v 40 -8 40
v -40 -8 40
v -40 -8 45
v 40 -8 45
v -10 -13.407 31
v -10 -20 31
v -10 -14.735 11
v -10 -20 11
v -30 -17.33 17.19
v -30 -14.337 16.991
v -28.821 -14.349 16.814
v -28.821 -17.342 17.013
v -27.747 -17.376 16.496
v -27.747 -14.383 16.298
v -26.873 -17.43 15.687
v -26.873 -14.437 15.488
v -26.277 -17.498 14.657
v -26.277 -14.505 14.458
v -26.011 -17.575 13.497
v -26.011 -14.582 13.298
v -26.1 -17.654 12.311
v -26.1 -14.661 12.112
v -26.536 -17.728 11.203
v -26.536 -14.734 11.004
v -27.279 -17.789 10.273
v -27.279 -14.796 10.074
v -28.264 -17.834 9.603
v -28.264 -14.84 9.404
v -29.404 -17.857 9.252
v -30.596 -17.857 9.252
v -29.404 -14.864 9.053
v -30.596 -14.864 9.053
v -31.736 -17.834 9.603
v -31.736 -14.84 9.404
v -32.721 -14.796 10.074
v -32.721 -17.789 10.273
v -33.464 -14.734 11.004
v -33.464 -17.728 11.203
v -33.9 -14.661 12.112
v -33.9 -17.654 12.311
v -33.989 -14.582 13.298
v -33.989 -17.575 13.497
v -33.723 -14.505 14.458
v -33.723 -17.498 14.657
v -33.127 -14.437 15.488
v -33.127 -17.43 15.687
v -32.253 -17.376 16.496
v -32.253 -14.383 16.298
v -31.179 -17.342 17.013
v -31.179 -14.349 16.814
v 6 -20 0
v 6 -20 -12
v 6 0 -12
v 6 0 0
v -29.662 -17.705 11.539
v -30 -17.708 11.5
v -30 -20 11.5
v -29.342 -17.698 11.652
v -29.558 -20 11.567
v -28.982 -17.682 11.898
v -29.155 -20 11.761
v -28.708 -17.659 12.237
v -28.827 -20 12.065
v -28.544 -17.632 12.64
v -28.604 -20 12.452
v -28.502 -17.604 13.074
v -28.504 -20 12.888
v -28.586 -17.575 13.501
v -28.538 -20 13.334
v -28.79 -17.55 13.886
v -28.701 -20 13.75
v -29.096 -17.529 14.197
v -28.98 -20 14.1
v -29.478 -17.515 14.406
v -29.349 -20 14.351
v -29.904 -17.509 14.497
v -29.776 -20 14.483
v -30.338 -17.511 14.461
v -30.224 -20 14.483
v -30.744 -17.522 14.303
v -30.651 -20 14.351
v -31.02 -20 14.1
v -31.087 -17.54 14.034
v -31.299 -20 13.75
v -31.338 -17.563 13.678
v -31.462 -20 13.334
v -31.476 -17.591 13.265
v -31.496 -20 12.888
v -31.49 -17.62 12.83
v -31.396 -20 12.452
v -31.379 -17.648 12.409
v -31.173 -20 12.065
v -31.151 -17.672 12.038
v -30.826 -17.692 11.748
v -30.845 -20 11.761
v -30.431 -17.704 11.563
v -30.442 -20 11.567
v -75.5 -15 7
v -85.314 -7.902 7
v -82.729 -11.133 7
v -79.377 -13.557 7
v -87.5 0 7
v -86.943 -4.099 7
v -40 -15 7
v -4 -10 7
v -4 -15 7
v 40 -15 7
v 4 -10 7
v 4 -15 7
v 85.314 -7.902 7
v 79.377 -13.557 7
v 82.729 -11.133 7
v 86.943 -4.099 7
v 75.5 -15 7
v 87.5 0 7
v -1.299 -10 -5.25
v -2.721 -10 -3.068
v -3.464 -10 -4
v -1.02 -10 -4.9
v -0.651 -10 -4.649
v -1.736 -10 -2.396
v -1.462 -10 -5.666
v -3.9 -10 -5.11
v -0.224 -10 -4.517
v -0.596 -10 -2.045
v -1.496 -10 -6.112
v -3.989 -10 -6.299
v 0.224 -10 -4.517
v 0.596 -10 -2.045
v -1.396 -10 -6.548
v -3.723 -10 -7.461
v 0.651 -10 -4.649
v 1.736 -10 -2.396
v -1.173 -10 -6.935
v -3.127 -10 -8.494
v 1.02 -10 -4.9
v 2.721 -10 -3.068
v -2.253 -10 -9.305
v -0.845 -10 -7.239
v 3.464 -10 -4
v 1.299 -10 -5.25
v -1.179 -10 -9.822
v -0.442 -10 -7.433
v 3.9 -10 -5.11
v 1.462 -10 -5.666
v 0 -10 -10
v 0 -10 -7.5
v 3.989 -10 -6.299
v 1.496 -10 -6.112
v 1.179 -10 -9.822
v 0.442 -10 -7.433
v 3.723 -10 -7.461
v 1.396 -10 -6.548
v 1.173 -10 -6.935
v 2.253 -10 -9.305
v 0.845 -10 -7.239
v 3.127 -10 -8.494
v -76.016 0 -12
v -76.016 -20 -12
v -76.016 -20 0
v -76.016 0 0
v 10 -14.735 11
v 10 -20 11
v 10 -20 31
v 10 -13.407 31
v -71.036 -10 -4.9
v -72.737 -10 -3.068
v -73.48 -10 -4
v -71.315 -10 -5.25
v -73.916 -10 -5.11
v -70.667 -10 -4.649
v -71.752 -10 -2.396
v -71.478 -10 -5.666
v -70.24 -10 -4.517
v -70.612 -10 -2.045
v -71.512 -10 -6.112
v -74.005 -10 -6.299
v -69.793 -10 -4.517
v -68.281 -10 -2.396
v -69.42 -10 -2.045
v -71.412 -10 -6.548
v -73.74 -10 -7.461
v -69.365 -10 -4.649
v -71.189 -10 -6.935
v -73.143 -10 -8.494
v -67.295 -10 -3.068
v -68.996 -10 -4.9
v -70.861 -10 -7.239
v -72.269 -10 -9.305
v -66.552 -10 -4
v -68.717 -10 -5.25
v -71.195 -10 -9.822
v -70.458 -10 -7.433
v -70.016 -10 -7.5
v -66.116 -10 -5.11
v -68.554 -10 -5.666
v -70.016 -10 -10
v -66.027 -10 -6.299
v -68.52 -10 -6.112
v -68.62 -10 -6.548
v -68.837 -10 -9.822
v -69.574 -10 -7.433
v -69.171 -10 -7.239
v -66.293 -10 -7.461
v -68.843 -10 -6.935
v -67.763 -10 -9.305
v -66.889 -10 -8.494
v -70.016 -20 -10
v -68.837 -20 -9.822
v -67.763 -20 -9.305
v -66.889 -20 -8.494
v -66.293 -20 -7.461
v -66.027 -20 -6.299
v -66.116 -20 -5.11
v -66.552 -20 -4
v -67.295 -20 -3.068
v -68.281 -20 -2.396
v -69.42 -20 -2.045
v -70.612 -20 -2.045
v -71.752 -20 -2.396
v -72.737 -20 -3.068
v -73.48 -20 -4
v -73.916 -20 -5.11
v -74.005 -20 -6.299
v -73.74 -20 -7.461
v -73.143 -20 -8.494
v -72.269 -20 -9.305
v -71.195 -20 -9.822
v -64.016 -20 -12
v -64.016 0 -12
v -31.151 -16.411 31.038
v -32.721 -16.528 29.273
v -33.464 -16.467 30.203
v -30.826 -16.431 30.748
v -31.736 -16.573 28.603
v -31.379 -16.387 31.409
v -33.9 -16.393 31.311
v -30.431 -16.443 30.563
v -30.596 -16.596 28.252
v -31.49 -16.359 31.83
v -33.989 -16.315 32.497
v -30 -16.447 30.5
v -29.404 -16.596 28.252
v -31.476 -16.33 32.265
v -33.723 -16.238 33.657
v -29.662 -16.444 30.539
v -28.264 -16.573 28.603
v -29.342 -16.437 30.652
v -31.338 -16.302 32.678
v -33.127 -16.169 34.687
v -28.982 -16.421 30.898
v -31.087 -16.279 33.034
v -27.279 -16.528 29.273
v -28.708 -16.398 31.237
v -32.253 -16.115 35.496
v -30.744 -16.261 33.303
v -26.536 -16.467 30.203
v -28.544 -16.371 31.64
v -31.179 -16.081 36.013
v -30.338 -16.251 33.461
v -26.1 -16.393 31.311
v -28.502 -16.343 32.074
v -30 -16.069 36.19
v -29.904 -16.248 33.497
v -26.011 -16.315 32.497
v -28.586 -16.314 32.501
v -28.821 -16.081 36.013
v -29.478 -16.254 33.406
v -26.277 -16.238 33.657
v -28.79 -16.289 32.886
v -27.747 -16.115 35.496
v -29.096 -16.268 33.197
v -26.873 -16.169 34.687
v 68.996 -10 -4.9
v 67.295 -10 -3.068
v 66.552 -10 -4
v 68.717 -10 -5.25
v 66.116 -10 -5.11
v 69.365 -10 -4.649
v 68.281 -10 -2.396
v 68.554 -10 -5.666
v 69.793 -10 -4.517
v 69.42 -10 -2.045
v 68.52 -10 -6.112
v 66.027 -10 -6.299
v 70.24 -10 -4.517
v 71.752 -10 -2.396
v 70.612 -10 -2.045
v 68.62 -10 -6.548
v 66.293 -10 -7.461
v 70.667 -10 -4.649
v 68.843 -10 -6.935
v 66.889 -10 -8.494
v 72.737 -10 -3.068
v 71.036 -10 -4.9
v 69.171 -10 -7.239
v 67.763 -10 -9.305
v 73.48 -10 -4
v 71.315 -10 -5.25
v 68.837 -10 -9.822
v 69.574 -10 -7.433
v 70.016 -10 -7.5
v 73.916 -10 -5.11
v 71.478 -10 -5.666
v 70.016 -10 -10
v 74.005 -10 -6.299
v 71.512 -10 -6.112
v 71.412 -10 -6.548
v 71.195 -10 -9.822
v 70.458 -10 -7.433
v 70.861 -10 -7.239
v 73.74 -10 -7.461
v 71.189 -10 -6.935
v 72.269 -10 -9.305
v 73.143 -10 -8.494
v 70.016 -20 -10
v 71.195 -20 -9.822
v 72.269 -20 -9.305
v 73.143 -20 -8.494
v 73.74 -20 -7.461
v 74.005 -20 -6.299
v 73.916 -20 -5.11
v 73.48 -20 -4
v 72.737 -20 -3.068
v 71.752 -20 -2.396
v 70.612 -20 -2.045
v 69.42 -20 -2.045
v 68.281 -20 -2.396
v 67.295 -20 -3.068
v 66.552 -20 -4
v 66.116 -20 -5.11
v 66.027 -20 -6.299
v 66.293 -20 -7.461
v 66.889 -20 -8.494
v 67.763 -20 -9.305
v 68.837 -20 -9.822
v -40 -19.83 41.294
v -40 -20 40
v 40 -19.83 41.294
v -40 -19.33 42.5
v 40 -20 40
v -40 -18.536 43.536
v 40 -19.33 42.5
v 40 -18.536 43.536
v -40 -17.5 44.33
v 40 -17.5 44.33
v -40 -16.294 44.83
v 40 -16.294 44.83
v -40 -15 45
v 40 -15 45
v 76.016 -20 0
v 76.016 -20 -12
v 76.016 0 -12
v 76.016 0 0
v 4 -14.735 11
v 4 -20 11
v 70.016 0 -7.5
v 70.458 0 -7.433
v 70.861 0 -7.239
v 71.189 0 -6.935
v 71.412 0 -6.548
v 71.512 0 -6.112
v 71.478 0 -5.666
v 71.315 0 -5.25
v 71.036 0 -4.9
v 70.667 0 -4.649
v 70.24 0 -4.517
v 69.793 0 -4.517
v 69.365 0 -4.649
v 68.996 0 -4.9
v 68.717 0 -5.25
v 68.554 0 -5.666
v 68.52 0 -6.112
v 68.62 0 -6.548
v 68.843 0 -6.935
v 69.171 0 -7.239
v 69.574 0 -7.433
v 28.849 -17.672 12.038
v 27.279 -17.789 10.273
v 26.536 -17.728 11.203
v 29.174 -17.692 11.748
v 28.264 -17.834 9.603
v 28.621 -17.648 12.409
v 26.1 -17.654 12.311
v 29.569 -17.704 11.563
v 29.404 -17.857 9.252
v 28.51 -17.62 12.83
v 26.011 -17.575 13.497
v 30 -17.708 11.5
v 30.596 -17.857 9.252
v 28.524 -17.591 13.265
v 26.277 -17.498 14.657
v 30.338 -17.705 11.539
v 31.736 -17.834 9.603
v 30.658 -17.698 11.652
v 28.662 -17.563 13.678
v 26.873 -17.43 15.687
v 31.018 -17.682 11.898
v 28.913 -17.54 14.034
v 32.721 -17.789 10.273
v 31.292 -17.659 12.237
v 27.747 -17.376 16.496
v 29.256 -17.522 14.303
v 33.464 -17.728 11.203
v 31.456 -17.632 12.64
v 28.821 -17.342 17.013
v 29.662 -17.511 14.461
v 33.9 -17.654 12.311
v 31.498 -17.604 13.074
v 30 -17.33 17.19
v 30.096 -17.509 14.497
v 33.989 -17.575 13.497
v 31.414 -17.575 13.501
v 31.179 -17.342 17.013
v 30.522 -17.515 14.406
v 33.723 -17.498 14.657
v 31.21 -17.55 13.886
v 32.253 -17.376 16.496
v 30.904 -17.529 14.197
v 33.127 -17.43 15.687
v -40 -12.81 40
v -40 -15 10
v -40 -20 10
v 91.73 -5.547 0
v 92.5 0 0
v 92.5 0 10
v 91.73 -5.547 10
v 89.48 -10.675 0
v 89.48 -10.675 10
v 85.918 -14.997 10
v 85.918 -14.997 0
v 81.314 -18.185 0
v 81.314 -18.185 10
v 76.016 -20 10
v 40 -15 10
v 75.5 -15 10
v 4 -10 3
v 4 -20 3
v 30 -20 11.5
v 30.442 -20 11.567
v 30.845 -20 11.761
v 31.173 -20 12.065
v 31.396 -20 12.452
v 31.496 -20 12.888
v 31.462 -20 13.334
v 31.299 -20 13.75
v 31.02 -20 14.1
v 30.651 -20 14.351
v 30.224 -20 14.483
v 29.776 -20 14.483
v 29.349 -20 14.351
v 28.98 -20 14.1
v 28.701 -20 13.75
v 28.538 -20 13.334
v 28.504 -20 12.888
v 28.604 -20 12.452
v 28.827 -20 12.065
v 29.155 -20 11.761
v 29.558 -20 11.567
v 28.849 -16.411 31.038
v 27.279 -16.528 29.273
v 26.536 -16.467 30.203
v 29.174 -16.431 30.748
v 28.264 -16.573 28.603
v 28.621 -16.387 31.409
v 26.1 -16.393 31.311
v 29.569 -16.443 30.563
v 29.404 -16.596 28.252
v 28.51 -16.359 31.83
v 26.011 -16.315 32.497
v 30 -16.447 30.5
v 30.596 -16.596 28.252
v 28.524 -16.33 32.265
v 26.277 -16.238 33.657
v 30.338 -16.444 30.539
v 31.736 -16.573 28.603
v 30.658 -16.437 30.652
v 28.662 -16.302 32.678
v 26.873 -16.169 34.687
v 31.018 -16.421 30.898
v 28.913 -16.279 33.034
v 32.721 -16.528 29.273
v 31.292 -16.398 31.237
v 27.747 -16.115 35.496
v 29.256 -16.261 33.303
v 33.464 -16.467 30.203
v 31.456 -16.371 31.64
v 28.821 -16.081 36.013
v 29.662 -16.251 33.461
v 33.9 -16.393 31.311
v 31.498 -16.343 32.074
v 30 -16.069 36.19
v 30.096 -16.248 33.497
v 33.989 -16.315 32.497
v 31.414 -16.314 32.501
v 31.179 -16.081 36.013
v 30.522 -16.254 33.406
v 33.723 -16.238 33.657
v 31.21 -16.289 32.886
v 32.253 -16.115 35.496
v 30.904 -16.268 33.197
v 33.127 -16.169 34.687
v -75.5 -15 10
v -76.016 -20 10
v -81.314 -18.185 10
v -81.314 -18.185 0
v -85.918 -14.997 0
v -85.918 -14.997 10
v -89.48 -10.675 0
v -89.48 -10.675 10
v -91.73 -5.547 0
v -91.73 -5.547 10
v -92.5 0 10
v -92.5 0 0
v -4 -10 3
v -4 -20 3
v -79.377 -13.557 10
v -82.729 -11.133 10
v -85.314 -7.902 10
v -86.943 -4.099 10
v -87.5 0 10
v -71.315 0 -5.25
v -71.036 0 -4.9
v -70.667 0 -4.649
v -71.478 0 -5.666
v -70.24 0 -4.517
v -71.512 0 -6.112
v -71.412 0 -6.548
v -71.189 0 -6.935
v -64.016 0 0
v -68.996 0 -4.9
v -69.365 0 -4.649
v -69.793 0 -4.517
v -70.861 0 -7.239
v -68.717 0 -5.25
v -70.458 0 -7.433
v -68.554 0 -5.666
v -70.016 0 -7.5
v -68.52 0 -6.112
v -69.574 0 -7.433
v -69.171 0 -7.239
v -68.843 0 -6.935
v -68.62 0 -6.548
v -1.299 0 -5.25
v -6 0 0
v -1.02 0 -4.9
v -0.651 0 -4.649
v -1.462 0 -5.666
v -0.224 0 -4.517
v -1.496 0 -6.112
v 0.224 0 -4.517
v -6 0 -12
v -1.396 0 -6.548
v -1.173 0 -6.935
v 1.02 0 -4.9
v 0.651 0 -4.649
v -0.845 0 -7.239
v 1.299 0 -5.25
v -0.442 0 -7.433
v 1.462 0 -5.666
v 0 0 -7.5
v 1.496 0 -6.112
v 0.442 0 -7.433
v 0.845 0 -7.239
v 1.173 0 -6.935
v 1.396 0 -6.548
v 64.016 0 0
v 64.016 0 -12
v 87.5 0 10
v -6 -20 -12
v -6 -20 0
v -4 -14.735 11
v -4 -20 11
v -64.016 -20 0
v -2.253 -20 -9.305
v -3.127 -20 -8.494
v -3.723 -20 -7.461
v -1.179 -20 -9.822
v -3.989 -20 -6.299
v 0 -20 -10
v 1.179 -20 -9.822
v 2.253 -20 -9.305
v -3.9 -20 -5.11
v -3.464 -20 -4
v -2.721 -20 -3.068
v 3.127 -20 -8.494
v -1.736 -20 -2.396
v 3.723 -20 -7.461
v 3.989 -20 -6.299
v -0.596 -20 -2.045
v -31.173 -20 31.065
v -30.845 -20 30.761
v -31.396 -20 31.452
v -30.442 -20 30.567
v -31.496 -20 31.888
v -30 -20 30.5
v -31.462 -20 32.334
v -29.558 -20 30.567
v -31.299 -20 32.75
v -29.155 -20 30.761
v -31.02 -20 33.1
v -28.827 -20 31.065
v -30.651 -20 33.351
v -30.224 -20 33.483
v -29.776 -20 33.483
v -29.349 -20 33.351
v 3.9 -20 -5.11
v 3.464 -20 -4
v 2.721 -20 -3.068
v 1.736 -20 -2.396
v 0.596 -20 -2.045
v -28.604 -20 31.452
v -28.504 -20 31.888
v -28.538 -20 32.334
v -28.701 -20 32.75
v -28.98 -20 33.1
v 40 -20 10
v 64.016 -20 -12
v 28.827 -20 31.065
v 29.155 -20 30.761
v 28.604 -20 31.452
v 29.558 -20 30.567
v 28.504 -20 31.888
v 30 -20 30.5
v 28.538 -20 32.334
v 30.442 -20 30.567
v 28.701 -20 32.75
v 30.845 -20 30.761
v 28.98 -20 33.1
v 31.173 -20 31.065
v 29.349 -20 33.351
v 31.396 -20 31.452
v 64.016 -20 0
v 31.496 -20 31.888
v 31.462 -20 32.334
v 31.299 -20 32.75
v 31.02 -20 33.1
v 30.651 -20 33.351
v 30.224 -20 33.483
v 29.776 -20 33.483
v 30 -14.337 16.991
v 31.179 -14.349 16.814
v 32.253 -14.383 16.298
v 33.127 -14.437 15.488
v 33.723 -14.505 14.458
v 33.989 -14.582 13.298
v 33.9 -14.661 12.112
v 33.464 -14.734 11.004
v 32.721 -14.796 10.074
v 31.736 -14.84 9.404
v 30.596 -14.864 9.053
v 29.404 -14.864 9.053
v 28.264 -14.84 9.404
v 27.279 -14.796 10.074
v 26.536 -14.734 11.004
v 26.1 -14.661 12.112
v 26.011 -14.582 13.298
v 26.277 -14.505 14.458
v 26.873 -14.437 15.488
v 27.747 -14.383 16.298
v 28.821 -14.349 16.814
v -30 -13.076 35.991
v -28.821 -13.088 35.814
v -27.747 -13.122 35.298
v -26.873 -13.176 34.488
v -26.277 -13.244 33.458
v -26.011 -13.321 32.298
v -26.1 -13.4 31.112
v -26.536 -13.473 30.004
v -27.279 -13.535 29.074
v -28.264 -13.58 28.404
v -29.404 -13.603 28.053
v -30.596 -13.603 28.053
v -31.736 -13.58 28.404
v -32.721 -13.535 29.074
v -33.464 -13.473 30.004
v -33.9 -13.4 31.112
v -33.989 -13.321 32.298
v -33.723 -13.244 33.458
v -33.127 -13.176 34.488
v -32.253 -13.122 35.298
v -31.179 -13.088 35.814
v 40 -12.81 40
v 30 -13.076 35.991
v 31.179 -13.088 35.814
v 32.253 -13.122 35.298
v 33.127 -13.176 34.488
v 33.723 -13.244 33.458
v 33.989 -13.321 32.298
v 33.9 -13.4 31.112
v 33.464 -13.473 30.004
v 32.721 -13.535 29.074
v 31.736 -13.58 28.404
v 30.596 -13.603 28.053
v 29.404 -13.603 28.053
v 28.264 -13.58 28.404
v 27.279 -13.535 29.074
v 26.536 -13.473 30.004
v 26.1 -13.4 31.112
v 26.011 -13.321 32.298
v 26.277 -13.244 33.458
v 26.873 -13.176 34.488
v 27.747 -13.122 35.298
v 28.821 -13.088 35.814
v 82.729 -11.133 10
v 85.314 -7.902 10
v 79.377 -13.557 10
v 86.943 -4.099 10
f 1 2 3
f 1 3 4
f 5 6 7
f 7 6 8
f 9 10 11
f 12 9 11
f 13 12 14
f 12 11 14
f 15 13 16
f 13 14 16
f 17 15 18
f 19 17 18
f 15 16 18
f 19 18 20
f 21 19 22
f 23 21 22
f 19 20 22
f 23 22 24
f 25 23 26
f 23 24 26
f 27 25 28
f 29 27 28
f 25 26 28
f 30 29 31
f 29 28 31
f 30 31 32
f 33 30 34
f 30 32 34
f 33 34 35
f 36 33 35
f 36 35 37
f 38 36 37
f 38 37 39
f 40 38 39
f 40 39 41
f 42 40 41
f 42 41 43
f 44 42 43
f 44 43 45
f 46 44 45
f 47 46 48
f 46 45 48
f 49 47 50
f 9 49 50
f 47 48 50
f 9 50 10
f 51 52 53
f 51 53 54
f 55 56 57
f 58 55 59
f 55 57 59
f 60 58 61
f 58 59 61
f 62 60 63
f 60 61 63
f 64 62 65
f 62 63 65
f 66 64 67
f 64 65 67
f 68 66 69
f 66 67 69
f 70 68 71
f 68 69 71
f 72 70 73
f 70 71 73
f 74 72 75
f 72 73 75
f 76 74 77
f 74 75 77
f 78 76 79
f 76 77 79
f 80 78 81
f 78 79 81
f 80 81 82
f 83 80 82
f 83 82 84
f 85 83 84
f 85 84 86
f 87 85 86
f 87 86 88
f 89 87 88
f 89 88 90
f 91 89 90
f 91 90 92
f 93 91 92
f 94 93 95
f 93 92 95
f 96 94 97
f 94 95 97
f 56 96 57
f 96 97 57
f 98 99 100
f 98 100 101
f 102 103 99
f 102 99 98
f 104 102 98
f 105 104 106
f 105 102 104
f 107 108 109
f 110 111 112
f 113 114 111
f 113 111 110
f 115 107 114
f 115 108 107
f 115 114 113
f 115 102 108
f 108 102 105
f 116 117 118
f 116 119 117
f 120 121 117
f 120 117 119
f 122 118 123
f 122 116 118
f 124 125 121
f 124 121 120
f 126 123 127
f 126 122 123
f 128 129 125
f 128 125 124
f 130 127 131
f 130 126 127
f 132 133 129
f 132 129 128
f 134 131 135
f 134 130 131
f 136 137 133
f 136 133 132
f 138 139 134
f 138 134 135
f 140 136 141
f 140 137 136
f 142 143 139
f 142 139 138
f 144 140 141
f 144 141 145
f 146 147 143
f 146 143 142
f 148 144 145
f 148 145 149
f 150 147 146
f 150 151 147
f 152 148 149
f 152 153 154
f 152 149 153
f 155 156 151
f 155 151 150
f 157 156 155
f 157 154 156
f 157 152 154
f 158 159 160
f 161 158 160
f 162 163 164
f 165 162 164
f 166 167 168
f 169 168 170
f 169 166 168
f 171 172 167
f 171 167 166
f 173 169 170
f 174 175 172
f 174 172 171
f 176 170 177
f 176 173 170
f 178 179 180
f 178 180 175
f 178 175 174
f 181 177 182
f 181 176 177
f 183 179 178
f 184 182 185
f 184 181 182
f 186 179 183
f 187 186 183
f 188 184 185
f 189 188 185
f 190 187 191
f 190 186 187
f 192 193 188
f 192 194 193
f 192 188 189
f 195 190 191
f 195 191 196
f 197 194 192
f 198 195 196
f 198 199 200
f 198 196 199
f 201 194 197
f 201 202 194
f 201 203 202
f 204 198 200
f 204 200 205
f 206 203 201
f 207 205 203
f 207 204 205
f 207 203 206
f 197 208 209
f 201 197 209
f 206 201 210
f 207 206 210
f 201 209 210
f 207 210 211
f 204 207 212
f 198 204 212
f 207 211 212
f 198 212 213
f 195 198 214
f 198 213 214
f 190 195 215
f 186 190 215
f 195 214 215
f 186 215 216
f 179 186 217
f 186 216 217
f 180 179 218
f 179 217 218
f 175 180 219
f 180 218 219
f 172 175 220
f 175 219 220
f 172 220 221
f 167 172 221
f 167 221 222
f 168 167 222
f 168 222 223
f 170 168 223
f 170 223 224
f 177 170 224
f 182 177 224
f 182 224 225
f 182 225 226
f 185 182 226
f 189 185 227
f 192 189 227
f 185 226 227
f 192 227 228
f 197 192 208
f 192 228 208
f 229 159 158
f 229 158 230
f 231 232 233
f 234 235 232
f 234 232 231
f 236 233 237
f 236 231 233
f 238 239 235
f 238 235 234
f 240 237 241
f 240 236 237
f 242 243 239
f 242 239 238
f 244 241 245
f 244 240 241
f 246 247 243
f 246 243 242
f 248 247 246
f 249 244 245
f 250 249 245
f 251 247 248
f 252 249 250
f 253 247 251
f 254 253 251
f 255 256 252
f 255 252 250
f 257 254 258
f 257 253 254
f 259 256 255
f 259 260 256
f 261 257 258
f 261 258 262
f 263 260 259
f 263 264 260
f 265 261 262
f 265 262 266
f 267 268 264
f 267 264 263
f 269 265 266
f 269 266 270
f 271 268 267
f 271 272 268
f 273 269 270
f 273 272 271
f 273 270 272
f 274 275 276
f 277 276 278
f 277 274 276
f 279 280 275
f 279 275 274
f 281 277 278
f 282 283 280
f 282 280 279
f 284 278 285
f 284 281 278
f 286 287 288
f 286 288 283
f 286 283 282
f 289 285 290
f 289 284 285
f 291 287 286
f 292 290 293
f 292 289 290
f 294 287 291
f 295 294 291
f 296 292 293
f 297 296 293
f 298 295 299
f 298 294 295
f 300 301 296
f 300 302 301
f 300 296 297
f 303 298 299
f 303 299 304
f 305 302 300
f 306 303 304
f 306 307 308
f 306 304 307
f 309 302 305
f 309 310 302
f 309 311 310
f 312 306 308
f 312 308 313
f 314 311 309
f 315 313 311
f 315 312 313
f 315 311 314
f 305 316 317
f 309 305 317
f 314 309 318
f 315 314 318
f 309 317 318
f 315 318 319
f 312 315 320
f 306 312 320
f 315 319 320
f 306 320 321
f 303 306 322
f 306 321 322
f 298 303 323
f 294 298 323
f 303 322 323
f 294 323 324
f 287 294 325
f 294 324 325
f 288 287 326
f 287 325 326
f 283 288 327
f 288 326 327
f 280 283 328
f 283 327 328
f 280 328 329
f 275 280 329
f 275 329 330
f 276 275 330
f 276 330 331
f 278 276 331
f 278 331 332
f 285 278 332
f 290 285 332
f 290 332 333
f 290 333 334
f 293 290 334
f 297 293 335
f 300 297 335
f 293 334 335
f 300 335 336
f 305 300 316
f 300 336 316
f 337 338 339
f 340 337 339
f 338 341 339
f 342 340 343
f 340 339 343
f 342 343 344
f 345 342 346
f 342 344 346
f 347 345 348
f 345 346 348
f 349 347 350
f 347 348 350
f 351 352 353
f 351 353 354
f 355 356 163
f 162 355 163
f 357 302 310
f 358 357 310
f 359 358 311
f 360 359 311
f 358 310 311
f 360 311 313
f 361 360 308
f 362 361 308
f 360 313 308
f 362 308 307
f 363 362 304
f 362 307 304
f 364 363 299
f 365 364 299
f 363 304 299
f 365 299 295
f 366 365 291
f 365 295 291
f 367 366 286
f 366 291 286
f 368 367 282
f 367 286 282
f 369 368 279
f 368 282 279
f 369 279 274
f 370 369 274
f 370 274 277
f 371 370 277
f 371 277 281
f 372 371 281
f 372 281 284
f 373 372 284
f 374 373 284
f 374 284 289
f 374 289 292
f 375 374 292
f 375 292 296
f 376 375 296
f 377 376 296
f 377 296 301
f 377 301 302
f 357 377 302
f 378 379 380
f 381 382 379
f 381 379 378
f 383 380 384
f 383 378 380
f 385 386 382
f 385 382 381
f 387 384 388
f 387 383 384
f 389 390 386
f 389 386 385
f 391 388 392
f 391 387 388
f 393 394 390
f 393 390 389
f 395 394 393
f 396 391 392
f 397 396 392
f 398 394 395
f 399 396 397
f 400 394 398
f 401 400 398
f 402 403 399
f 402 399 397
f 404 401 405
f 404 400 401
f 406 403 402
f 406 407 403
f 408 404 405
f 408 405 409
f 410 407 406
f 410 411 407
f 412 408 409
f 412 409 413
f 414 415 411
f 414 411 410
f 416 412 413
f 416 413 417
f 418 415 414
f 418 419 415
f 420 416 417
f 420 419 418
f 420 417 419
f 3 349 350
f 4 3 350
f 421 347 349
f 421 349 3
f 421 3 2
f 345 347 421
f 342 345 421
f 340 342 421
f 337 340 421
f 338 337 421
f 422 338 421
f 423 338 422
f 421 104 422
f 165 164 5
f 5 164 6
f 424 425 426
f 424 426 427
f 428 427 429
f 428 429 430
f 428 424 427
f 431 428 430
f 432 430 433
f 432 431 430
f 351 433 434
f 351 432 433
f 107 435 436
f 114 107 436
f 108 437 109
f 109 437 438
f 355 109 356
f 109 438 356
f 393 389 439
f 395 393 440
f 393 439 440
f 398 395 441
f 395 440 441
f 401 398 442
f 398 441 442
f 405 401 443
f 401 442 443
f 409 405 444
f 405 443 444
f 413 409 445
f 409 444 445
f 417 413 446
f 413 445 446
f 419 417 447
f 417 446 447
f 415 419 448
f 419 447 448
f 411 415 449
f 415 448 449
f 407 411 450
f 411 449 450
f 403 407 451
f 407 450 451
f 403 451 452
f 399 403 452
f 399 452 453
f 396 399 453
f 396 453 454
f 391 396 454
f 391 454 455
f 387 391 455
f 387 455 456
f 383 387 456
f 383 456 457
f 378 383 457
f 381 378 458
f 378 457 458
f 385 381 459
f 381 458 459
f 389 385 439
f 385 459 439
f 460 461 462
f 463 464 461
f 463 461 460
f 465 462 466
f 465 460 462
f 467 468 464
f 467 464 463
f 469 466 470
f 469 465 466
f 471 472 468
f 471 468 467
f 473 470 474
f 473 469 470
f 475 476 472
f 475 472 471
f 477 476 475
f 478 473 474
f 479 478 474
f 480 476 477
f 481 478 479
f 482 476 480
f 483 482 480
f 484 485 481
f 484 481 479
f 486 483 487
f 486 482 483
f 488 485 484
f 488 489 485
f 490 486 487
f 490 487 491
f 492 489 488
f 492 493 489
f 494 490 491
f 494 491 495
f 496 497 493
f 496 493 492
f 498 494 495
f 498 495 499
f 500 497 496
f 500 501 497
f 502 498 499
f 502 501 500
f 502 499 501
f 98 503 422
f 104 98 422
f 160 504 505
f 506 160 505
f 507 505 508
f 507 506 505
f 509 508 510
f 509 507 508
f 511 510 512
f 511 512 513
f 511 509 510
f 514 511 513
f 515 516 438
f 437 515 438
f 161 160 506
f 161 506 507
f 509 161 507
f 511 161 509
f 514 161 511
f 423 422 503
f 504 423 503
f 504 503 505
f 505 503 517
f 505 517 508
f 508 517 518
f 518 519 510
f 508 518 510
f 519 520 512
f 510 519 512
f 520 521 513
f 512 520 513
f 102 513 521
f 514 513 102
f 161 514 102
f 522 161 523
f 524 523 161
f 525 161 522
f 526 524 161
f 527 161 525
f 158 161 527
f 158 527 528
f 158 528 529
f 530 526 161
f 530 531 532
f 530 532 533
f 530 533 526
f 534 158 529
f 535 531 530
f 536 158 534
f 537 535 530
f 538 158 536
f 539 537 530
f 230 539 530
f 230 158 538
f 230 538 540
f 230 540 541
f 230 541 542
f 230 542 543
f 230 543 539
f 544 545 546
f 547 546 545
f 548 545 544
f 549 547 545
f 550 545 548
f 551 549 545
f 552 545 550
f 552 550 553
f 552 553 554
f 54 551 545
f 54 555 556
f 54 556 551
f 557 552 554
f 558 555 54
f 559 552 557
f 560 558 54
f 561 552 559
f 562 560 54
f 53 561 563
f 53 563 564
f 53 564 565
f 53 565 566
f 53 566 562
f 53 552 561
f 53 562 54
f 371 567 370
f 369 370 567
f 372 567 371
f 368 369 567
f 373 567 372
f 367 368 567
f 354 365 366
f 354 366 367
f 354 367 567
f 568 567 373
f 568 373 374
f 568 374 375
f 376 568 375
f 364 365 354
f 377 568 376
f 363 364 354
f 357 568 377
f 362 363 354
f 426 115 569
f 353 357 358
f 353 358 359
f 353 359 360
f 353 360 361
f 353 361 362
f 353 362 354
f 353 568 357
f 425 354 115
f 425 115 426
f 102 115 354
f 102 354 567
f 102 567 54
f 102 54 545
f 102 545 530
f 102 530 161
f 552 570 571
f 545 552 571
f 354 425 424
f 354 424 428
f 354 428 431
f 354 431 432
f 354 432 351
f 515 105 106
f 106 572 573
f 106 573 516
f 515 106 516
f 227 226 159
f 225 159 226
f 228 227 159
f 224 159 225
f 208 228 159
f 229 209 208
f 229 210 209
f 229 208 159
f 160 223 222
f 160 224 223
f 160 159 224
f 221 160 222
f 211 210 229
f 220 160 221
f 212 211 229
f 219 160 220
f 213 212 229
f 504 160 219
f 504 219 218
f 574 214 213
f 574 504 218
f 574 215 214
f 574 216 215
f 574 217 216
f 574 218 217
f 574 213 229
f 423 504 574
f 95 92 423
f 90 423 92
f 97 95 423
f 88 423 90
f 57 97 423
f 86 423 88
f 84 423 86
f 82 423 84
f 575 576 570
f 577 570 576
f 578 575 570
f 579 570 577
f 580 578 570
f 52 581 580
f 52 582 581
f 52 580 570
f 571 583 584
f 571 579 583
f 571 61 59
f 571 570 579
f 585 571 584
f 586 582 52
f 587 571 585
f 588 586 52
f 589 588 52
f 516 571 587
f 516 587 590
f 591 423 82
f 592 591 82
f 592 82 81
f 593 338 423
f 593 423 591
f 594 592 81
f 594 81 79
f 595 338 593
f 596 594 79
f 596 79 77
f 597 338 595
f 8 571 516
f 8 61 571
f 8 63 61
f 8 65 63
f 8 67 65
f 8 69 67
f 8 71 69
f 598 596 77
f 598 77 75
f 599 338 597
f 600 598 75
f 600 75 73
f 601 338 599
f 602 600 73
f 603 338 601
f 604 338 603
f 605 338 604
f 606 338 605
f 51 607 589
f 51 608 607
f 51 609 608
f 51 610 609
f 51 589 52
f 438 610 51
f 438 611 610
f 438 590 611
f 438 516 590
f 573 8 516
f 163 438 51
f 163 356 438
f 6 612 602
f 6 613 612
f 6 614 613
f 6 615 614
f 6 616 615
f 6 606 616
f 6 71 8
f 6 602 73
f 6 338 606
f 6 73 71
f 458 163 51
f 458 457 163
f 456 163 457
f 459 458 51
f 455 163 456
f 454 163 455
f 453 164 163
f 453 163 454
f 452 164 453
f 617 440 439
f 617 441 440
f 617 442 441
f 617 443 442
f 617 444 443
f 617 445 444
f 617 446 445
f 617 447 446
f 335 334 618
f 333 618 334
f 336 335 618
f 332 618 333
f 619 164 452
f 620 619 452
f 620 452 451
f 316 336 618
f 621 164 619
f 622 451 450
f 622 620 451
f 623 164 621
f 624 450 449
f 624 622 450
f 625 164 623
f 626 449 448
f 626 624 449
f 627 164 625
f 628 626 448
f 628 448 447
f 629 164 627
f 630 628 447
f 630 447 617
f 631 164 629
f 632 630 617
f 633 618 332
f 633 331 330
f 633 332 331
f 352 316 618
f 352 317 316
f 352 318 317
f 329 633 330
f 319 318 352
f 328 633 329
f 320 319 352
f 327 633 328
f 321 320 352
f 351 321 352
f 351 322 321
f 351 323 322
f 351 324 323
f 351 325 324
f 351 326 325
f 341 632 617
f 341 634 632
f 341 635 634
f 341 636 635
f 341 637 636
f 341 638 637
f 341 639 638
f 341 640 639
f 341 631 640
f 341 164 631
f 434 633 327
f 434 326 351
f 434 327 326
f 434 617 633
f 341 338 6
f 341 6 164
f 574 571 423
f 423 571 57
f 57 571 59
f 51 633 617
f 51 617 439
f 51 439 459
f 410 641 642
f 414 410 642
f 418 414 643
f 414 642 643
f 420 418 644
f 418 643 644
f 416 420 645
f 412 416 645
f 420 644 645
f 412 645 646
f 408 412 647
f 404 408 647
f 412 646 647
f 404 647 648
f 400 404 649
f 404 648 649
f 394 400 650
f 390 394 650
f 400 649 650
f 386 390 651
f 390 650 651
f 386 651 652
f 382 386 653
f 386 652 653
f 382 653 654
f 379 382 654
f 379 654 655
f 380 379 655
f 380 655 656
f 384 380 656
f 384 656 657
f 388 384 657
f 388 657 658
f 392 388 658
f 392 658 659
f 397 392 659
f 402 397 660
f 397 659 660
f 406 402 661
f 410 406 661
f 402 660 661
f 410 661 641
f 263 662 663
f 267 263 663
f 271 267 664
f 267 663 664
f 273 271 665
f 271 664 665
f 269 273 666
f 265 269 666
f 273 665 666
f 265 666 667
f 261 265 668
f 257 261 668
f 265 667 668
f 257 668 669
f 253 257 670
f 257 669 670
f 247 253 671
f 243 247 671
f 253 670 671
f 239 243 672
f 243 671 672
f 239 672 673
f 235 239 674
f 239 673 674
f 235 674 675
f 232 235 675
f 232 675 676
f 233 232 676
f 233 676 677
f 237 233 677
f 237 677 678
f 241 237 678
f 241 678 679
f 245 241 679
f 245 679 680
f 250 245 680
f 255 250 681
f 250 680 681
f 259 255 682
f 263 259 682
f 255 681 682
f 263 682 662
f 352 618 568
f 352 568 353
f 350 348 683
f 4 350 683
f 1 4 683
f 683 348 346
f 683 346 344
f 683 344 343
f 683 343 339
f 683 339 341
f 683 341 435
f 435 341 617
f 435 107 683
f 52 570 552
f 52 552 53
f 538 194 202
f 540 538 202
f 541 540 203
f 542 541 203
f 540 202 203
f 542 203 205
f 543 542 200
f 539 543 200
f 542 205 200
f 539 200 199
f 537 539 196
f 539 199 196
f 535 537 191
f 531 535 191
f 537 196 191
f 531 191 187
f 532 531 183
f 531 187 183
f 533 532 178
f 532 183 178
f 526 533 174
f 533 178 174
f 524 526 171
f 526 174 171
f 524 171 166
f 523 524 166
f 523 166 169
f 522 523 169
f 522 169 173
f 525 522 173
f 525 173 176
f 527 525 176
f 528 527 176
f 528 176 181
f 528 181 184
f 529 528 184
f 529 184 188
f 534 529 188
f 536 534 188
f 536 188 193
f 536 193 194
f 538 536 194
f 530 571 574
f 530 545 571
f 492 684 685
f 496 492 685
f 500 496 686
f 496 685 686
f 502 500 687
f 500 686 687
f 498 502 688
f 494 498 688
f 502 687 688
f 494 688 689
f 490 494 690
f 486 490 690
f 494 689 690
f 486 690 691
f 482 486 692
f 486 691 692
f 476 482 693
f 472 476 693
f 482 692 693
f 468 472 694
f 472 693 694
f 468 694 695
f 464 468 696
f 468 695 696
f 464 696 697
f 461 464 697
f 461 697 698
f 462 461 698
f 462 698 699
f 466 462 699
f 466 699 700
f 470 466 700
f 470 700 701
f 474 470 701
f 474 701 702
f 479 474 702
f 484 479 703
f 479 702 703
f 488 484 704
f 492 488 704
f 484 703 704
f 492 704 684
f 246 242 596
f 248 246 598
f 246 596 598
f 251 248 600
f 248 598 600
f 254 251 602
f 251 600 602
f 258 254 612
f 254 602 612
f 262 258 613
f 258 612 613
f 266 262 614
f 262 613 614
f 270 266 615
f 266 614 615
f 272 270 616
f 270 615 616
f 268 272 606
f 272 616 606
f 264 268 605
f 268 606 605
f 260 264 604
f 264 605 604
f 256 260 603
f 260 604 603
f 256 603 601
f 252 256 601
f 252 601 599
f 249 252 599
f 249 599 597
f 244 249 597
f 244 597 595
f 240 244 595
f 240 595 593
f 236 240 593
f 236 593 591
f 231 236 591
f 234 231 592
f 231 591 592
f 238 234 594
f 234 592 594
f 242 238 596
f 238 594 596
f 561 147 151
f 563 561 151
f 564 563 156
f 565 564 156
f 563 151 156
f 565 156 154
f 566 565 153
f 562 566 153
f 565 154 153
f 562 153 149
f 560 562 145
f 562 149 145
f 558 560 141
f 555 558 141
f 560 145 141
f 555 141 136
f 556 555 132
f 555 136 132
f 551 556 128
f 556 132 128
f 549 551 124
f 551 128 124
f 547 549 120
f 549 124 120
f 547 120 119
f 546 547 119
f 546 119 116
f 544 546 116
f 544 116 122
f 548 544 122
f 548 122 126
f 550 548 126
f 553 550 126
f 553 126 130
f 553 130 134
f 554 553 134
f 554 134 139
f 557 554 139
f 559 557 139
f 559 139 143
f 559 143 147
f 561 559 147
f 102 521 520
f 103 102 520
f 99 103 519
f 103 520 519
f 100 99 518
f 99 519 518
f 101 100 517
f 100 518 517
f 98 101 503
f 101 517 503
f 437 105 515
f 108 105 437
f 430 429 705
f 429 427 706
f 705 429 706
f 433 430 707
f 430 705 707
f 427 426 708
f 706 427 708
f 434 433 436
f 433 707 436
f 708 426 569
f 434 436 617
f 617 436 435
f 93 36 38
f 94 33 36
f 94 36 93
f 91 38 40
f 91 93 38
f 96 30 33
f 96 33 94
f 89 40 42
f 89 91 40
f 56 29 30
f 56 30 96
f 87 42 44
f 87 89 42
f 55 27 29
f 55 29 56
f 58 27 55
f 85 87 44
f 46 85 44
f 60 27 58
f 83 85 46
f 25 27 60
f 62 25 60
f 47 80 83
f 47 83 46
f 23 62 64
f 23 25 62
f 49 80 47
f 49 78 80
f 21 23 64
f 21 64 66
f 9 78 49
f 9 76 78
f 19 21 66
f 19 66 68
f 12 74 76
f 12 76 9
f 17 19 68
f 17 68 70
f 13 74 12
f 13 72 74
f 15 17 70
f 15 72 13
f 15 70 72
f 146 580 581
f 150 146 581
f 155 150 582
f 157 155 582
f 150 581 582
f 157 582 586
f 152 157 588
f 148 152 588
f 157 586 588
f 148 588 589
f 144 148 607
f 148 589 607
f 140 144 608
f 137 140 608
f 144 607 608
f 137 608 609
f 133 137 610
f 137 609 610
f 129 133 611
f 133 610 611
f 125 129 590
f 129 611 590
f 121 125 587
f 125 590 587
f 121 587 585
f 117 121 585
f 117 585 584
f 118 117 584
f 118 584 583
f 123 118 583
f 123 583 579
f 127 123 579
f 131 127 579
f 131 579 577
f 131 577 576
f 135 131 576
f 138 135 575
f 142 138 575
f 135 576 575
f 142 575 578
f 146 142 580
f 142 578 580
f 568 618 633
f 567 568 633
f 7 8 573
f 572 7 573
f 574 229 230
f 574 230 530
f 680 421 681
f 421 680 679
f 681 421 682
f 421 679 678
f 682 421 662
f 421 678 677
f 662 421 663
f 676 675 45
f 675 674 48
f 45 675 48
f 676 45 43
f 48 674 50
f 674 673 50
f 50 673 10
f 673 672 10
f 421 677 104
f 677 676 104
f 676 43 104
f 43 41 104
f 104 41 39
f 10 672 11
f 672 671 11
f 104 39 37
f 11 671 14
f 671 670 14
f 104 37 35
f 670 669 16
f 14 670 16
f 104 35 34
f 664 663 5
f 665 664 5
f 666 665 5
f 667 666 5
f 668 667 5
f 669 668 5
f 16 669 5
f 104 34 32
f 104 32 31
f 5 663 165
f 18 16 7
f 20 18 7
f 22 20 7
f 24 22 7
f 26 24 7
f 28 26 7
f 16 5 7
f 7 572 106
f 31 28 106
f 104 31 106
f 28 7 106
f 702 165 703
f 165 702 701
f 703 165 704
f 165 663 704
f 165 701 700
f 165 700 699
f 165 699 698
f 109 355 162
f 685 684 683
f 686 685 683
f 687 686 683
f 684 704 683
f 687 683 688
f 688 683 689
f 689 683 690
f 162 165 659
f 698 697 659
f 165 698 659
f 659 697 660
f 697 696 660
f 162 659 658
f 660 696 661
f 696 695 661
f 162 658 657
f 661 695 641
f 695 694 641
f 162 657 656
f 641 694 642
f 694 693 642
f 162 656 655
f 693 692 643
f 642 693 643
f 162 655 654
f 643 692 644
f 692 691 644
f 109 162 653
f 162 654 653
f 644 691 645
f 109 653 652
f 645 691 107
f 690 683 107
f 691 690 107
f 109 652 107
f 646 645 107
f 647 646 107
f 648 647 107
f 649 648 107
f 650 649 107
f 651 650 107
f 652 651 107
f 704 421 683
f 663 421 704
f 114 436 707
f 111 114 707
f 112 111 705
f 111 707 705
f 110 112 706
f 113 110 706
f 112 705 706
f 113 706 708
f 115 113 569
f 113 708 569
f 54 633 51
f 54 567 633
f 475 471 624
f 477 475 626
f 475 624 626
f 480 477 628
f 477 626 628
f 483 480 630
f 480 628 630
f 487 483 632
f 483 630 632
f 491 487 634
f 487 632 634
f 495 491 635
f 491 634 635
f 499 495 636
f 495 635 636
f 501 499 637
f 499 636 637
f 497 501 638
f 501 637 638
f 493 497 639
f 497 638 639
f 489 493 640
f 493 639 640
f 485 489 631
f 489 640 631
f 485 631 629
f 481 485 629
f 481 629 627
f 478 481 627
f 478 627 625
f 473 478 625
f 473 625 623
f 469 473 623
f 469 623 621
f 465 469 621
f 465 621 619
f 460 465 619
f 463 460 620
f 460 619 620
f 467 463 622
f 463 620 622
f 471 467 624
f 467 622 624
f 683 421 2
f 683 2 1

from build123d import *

# Parameters (mm, degrees)
ESTRUSIONE_ESTRUSIONE1_DEPTH  = 10
TAGLIO_ESTRUSIONE1_DEPTH      = 3
SCHIZZO4_W                    = 80
SCHIZZO4_H                    = 5
ESTRUSIONE_ESTRUSIONE2_DEPTH  = 35
ESTRUSIONE_ESTRUSIONE4_DEPTH  = 80
SCHIZZO7_W                    = 80
SCHIZZO7_H                    = 5
ESTRUSIONE_ESTRUSIONE5_DEPTH  = 7
TAGLIO_ESTRUSIONE2_REACH      = 112.369
SCHIZZO8_R                    = 1.5
RACCORDO1_R                   = 5
RACCORDO2_R                   = 5
TAGLIO_ESTRUSIONE3_DEPTH      = 111.368700273
TAGLIO_ESTRUSIONE3_DEPTH_BACK = 10
SCHIZZO11_R                   = 4
TAGLIO_ESTRUSIONE4_DEPTH      = 3
SCHIZZO12_W                   = 12
SCHIZZO12_H                   = 12
ESTRUSIONE_ESTRUSIONE6_DEPTH  = 40
SCHIZZO13_R                   = 1.5
TAGLIO_ESTRUSIONE5_DEPTH      = 111.368700273
SCHIZZO14_R                   = 4
TAGLIO_ESTRUSIONE6_DEPTH      = 10


with BuildPart() as part:
    # Schizzo1 → Estrusione-Estrusione1 (new body)
    with BuildSketch(Plane.XY):
        with BuildLine():
            Line((-76.016095604, 20), (76.016095604, 20))
            ThreePointArc((76.016095604, 20), (92.5, 0), (76.016095604, -20))
            Line((76.016095604, -20), (-76.016095604, -20))
            ThreePointArc((-76.016095604, -20), (-92.5, 0), (-76.016095604, 20))
        make_face()
    extrude(amount=ESTRUSIONE_ESTRUSIONE1_DEPTH)

    # Schizzo3 → Taglio-Estrusione1 (cut)
    with BuildSketch(Plane.XY.offset(10)):
        with BuildLine():
            Line((-75.5, -15), (75.5, -15))
            ThreePointArc((75.5, -15), (87.5, 0), (75.5, 15))
            Line((75.5, 15), (-75.5, 15))
            ThreePointArc((-75.5, 15), (-87.5, 0), (-75.5, -15))
        make_face()
    extrude(amount=-TAGLIO_ESTRUSIONE1_DEPTH, mode=Mode.SUBTRACT)

    # Schizzo4 → Estrusione-Estrusione2 (add)
    with BuildSketch(Plane.XY.offset(10)):
        with Locations((0, -17.5)):
            Rectangle(SCHIZZO4_W, SCHIZZO4_H)
    estrusione_estrusione2 = extrude(amount=ESTRUSIONE_ESTRUSIONE2_DEPTH)

    # Schizzo6 → Estrusione-Estrusione4 (add)
    with BuildSketch(Plane(origin=(40, 0, 0), x_dir=(0, 0, -1), z_dir=(1, 0, 0))):
        Polygon((-40, -15), (-40, -12.81), (-7, -15), align=None)
    estrusione_estrusione4 = extrude(amount=-ESTRUSIONE_ESTRUSIONE4_DEPTH)

    # Schizzo7 → Estrusione-Estrusione5 (add)
    with BuildSketch(Plane(origin=(0, -15, 0), x_dir=(1, 0, 0), z_dir=(0, 1, 0))):
        with Locations((0, -42.5)):
            Rectangle(SCHIZZO7_W, SCHIZZO7_H)
    estrusione_estrusione5 = extrude(amount=ESTRUSIONE_ESTRUSIONE5_DEPTH)

    # Taglio-Estrusione2: up to this plane
    taglio_estrusione2_end = Plane(origin=(-40, -12.81, 40), z_dir=(1.4576135341627736e-15, 0.9978051809344605, -0.0662179801892863))
    # Schizzo8 → Taglio-Estrusione2 (cut, up to the surface)
    with BuildSketch(Plane.XZ.offset(20), mode=Mode.PRIVATE) as taglio_estrusione2_sk1:
        with Locations(Location((-30, 13, 0), (0, 0, 270))):
            Circle(SCHIZZO8_R)
    taglio_estrusione2_tool1 = split(extrude(taglio_estrusione2_sk1.sketch, amount=-TAGLIO_ESTRUSIONE2_REACH, mode=Mode.PRIVATE), bisect_by=taglio_estrusione2_end, keep=Keep.BOTH, mode=Mode.PRIVATE)
    add(taglio_estrusione2_tool1.solids().sort_by_distance((-30, -20, 13))[0], mode=Mode.SUBTRACT)
    # Schizzo8 → Taglio-Estrusione2 (cut, up to the surface)
    with BuildSketch(Plane.XZ.offset(20), mode=Mode.PRIVATE) as taglio_estrusione2_sk2:
        with Locations(Location((-30, 32, 0), (0, 0, 270))):
            Circle(SCHIZZO8_R)
    taglio_estrusione2_tool2 = split(extrude(taglio_estrusione2_sk2.sketch, amount=-TAGLIO_ESTRUSIONE2_REACH, mode=Mode.PRIVATE), bisect_by=taglio_estrusione2_end, keep=Keep.BOTH, mode=Mode.PRIVATE)
    add(taglio_estrusione2_tool2.solids().sort_by_distance((-30, -20, 32))[0], mode=Mode.SUBTRACT)
    # Schizzo8 → Taglio-Estrusione2 (cut, up to the surface)
    with BuildSketch(Plane.XZ.offset(20), mode=Mode.PRIVATE) as taglio_estrusione2_sk3:
        with Locations(Location((30, 13, 0), (0, 0, 270))):
            Circle(SCHIZZO8_R)
    taglio_estrusione2_tool3 = split(extrude(taglio_estrusione2_sk3.sketch, amount=-TAGLIO_ESTRUSIONE2_REACH, mode=Mode.PRIVATE), bisect_by=taglio_estrusione2_end, keep=Keep.BOTH, mode=Mode.PRIVATE)
    add(taglio_estrusione2_tool3.solids().sort_by_distance((30, -20, 13))[0], mode=Mode.SUBTRACT)
    # Schizzo8 → Taglio-Estrusione2 (cut, up to the surface)
    with BuildSketch(Plane.XZ.offset(20), mode=Mode.PRIVATE) as taglio_estrusione2_sk4:
        with Locations(Location((30, 32, 0), (0, 0, 270))):
            Circle(SCHIZZO8_R)
    taglio_estrusione2_tool4 = split(extrude(taglio_estrusione2_sk4.sketch, amount=-TAGLIO_ESTRUSIONE2_REACH, mode=Mode.PRIVATE), bisect_by=taglio_estrusione2_end, keep=Keep.BOTH, mode=Mode.PRIVATE)
    add(taglio_estrusione2_tool4.solids().sort_by_distance((30, -20, 32))[0], mode=Mode.SUBTRACT)

    # Specchia1: Estrusione-Estrusione2, Estrusione-Estrusione4, Estrusione-Estrusione5 across plane
    add(estrusione_estrusione2.mirror(Plane.ZX))
    add(estrusione_estrusione4.mirror(Plane.ZX))
    add(estrusione_estrusione5.mirror(Plane.ZX))

    # Raccordo1
    raccordo1_edges = [part.edges().sort_by_distance(p)[0] for p in [
        (0, -20, 45),
    ]]
    fillet(raccordo1_edges, radius=RACCORDO1_R)

    # Raccordo2
    raccordo2_edges = [part.edges().sort_by_distance(p)[0] for p in [
        (0, 20, 45),
    ]]
    fillet(raccordo2_edges, radius=RACCORDO2_R)

    # Schizzo9 → Taglio-Estrusione3 (cut, two sides)
    with BuildSketch(Plane.XZ.offset(20)) as taglio_estrusione3_sk:
        Polygon((-4, 11), (-4, 3), (4, 3), (4, 11), (10, 11), (10, 31), (-10, 31), (-10, 11), align=None)
    extrude(amount=TAGLIO_ESTRUSIONE3_DEPTH, mode=Mode.SUBTRACT)
    extrude(taglio_estrusione3_sk.sketch, amount=-TAGLIO_ESTRUSIONE3_DEPTH_BACK, mode=Mode.SUBTRACT)

    # Schizzo11 → Taglio-Estrusione4 (cut)
    with BuildSketch(Plane(origin=(0, -15.396736192, 1.021783402), x_dir=(1, 0, 0), z_dir=(1.4576135341627738e-15, 0.9978051809344605, -0.06621798018928632))):
        with Locations(Location((-30, -12.004564445, 0), (0, 0, 270))):
            Circle(SCHIZZO11_R)
        with Locations(Location((-30, -31.046357736, 0), (0, 0, 270))):
            Circle(SCHIZZO11_R)
        with Locations(Location((30, -31.046357736, 0), (0, 0, 270))):
            Circle(SCHIZZO11_R)
        with Locations(Location((30, -12.004564445, 0), (0, 0, 270))):
            Circle(SCHIZZO11_R)
    extrude(amount=-TAGLIO_ESTRUSIONE4_DEPTH, mode=Mode.SUBTRACT)

    # Schizzo12 → Estrusione-Estrusione6 (add)
    with BuildSketch(Plane.XZ.offset(20)):
        with Locations((70.016095604, -6)):
            Rectangle(SCHIZZO12_W, SCHIZZO12_H)
        with Locations((-70.016095604, -6)):
            Rectangle(SCHIZZO12_W, SCHIZZO12_H)
        with Locations((0, -6)):
            Rectangle(SCHIZZO12_W, SCHIZZO12_H)
    extrude(amount=-ESTRUSIONE_ESTRUSIONE6_DEPTH)

    # Schizzo13 → Taglio-Estrusione5 (cut, through all)
    with BuildSketch(Plane.XZ.offset(20)):
        with Locations(Location((-70.016095604, -6, 0), (0, 0, 270))):
            Circle(SCHIZZO13_R)
        with Locations(Location((0, -6, 0), (0, 0, 270))):
            Circle(SCHIZZO13_R)
        with Locations(Location((70.016095604, -6, 0), (0, 0, 270))):
            Circle(SCHIZZO13_R)
    extrude(amount=-TAGLIO_ESTRUSIONE5_DEPTH, mode=Mode.SUBTRACT)

    # Schizzo14 → Taglio-Estrusione6 (cut)
    with BuildSketch(Plane.XZ.offset(20)):
        with Locations(Location((-70.016095604, -6, 0), (0, 0, 270))):
            Circle(SCHIZZO14_R)
        with Locations(Location((0, -6, 0), (0, 0, 270))):
            Circle(SCHIZZO14_R)
        with Locations(Location((70.016095604, -6, 0), (0, 0, 270))):
            Circle(SCHIZZO14_R)
    taglio_estrusione6 = extrude(amount=-TAGLIO_ESTRUSIONE6_DEPTH, mode=Mode.SUBTRACT)

    # Specchia2: Taglio-Estrusione6 across plane
    add(taglio_estrusione6.mirror(Plane.ZX), mode=Mode.SUBTRACT)

    # TaglioSuperficie1
    split(bisect_by=Plane(origin=(0, 0, 0), x_dir=(1, 0, 0), z_dir=(0, 1, 0)), keep=Keep.BOTTOM)


solid = part.part
